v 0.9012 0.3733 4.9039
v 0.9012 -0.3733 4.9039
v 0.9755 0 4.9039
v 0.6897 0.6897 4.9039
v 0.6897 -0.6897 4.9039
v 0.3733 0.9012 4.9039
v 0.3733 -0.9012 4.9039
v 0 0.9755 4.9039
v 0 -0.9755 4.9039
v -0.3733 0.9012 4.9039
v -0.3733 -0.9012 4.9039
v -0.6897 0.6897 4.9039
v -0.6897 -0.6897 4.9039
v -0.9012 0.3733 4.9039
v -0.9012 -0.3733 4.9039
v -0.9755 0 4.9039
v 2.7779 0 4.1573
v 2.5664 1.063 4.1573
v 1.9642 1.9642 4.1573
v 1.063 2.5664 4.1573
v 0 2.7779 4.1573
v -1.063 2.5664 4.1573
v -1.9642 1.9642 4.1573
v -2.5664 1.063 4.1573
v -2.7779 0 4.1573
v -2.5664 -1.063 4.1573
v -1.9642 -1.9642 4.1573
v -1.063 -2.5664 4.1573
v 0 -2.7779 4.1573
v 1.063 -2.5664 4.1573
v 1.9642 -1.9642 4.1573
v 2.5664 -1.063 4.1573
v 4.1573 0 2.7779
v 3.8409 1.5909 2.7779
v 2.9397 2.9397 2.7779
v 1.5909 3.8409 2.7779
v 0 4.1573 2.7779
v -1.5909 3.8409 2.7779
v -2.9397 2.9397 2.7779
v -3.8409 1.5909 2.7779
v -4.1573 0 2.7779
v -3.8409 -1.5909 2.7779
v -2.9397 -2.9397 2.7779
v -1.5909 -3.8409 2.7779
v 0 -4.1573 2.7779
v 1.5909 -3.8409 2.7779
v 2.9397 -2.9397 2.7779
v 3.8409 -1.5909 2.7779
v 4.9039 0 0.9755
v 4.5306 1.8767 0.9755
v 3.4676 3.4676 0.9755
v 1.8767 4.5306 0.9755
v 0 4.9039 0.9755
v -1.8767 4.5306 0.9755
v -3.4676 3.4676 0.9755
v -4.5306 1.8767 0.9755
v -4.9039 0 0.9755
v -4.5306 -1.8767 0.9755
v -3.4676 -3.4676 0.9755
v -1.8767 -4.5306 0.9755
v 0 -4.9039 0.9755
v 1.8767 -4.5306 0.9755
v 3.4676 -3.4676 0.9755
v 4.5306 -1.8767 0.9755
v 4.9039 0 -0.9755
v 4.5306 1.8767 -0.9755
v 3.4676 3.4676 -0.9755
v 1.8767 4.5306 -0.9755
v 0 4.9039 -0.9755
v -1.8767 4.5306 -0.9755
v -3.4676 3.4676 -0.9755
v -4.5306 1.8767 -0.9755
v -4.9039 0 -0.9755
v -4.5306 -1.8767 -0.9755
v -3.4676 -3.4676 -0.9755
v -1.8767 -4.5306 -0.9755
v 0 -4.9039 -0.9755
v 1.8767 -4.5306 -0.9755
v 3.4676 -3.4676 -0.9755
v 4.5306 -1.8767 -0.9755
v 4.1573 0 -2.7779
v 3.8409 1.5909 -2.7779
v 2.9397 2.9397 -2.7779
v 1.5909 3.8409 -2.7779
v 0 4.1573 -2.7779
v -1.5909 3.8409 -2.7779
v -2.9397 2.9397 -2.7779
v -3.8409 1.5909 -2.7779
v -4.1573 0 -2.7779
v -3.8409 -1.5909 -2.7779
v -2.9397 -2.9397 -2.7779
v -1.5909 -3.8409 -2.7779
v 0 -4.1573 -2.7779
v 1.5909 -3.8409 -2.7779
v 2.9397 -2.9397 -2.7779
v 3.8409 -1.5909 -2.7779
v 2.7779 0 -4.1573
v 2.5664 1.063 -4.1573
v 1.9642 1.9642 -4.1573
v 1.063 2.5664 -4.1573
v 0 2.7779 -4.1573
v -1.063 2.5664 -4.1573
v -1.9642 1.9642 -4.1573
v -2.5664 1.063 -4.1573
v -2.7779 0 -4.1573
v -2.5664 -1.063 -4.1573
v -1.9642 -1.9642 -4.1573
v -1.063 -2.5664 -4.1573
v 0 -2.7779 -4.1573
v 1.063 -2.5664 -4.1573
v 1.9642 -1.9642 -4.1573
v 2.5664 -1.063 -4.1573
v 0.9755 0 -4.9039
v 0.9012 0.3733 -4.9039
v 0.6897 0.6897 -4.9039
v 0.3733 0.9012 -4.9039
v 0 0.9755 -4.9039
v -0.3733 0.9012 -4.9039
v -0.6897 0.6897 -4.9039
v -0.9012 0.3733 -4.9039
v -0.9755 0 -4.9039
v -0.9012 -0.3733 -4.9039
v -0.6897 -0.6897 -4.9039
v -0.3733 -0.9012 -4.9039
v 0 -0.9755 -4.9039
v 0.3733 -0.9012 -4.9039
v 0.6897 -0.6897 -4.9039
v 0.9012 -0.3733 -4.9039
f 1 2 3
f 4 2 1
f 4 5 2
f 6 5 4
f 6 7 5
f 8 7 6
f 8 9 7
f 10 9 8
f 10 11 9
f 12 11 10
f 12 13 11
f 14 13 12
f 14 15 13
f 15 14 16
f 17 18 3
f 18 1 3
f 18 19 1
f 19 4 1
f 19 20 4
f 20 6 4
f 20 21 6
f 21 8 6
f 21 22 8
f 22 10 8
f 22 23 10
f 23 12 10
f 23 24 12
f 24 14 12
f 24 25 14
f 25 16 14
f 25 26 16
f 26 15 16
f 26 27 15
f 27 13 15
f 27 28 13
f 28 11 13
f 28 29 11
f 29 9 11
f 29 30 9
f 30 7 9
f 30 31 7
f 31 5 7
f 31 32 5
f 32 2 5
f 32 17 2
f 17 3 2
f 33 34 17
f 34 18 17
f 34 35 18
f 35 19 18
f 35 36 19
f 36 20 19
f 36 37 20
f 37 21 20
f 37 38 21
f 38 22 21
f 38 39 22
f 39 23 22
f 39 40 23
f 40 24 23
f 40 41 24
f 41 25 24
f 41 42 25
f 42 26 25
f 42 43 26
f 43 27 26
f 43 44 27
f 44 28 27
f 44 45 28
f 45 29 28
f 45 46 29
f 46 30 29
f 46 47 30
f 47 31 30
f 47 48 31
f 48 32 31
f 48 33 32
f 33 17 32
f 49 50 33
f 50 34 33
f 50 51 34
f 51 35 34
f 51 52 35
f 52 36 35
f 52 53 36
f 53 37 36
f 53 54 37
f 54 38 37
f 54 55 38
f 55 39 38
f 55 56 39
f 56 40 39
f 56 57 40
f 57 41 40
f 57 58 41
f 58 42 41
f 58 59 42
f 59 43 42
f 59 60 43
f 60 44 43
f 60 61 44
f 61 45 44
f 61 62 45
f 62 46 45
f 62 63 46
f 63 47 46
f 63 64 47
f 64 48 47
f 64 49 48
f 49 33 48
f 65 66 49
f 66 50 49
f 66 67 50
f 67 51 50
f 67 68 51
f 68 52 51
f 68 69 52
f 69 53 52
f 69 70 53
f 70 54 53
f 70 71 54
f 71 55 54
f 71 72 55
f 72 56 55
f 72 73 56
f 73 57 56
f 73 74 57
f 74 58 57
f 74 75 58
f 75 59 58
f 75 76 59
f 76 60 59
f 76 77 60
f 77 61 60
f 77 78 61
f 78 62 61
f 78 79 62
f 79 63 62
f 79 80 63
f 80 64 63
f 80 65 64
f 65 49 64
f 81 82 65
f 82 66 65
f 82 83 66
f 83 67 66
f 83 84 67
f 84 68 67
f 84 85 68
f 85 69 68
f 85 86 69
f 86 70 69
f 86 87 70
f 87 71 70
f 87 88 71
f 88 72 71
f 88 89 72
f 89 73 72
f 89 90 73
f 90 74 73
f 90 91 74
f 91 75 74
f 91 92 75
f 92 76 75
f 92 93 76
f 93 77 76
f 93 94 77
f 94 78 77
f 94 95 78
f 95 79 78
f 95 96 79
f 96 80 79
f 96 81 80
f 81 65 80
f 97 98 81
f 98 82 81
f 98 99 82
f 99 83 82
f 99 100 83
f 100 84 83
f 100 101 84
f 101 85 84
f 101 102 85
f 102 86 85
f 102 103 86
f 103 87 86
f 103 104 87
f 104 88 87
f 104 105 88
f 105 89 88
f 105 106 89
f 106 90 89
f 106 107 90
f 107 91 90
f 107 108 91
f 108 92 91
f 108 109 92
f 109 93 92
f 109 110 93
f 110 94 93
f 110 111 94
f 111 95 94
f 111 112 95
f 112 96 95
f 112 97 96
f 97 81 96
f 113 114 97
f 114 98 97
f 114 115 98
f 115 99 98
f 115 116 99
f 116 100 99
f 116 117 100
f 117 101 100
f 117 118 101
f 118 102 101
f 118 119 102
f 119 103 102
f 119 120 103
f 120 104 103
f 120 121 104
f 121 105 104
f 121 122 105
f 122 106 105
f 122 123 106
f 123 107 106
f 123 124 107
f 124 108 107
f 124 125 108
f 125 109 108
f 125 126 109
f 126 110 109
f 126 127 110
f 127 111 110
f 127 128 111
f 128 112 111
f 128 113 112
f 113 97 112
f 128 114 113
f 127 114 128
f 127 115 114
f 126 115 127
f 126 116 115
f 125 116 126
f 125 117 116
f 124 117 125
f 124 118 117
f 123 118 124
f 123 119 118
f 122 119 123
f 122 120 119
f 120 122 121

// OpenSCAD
// Unit of length: Unit.MM
sphere(d = 10.0, $fa = 12.0, $fs = 2.0, $fn = 0);
